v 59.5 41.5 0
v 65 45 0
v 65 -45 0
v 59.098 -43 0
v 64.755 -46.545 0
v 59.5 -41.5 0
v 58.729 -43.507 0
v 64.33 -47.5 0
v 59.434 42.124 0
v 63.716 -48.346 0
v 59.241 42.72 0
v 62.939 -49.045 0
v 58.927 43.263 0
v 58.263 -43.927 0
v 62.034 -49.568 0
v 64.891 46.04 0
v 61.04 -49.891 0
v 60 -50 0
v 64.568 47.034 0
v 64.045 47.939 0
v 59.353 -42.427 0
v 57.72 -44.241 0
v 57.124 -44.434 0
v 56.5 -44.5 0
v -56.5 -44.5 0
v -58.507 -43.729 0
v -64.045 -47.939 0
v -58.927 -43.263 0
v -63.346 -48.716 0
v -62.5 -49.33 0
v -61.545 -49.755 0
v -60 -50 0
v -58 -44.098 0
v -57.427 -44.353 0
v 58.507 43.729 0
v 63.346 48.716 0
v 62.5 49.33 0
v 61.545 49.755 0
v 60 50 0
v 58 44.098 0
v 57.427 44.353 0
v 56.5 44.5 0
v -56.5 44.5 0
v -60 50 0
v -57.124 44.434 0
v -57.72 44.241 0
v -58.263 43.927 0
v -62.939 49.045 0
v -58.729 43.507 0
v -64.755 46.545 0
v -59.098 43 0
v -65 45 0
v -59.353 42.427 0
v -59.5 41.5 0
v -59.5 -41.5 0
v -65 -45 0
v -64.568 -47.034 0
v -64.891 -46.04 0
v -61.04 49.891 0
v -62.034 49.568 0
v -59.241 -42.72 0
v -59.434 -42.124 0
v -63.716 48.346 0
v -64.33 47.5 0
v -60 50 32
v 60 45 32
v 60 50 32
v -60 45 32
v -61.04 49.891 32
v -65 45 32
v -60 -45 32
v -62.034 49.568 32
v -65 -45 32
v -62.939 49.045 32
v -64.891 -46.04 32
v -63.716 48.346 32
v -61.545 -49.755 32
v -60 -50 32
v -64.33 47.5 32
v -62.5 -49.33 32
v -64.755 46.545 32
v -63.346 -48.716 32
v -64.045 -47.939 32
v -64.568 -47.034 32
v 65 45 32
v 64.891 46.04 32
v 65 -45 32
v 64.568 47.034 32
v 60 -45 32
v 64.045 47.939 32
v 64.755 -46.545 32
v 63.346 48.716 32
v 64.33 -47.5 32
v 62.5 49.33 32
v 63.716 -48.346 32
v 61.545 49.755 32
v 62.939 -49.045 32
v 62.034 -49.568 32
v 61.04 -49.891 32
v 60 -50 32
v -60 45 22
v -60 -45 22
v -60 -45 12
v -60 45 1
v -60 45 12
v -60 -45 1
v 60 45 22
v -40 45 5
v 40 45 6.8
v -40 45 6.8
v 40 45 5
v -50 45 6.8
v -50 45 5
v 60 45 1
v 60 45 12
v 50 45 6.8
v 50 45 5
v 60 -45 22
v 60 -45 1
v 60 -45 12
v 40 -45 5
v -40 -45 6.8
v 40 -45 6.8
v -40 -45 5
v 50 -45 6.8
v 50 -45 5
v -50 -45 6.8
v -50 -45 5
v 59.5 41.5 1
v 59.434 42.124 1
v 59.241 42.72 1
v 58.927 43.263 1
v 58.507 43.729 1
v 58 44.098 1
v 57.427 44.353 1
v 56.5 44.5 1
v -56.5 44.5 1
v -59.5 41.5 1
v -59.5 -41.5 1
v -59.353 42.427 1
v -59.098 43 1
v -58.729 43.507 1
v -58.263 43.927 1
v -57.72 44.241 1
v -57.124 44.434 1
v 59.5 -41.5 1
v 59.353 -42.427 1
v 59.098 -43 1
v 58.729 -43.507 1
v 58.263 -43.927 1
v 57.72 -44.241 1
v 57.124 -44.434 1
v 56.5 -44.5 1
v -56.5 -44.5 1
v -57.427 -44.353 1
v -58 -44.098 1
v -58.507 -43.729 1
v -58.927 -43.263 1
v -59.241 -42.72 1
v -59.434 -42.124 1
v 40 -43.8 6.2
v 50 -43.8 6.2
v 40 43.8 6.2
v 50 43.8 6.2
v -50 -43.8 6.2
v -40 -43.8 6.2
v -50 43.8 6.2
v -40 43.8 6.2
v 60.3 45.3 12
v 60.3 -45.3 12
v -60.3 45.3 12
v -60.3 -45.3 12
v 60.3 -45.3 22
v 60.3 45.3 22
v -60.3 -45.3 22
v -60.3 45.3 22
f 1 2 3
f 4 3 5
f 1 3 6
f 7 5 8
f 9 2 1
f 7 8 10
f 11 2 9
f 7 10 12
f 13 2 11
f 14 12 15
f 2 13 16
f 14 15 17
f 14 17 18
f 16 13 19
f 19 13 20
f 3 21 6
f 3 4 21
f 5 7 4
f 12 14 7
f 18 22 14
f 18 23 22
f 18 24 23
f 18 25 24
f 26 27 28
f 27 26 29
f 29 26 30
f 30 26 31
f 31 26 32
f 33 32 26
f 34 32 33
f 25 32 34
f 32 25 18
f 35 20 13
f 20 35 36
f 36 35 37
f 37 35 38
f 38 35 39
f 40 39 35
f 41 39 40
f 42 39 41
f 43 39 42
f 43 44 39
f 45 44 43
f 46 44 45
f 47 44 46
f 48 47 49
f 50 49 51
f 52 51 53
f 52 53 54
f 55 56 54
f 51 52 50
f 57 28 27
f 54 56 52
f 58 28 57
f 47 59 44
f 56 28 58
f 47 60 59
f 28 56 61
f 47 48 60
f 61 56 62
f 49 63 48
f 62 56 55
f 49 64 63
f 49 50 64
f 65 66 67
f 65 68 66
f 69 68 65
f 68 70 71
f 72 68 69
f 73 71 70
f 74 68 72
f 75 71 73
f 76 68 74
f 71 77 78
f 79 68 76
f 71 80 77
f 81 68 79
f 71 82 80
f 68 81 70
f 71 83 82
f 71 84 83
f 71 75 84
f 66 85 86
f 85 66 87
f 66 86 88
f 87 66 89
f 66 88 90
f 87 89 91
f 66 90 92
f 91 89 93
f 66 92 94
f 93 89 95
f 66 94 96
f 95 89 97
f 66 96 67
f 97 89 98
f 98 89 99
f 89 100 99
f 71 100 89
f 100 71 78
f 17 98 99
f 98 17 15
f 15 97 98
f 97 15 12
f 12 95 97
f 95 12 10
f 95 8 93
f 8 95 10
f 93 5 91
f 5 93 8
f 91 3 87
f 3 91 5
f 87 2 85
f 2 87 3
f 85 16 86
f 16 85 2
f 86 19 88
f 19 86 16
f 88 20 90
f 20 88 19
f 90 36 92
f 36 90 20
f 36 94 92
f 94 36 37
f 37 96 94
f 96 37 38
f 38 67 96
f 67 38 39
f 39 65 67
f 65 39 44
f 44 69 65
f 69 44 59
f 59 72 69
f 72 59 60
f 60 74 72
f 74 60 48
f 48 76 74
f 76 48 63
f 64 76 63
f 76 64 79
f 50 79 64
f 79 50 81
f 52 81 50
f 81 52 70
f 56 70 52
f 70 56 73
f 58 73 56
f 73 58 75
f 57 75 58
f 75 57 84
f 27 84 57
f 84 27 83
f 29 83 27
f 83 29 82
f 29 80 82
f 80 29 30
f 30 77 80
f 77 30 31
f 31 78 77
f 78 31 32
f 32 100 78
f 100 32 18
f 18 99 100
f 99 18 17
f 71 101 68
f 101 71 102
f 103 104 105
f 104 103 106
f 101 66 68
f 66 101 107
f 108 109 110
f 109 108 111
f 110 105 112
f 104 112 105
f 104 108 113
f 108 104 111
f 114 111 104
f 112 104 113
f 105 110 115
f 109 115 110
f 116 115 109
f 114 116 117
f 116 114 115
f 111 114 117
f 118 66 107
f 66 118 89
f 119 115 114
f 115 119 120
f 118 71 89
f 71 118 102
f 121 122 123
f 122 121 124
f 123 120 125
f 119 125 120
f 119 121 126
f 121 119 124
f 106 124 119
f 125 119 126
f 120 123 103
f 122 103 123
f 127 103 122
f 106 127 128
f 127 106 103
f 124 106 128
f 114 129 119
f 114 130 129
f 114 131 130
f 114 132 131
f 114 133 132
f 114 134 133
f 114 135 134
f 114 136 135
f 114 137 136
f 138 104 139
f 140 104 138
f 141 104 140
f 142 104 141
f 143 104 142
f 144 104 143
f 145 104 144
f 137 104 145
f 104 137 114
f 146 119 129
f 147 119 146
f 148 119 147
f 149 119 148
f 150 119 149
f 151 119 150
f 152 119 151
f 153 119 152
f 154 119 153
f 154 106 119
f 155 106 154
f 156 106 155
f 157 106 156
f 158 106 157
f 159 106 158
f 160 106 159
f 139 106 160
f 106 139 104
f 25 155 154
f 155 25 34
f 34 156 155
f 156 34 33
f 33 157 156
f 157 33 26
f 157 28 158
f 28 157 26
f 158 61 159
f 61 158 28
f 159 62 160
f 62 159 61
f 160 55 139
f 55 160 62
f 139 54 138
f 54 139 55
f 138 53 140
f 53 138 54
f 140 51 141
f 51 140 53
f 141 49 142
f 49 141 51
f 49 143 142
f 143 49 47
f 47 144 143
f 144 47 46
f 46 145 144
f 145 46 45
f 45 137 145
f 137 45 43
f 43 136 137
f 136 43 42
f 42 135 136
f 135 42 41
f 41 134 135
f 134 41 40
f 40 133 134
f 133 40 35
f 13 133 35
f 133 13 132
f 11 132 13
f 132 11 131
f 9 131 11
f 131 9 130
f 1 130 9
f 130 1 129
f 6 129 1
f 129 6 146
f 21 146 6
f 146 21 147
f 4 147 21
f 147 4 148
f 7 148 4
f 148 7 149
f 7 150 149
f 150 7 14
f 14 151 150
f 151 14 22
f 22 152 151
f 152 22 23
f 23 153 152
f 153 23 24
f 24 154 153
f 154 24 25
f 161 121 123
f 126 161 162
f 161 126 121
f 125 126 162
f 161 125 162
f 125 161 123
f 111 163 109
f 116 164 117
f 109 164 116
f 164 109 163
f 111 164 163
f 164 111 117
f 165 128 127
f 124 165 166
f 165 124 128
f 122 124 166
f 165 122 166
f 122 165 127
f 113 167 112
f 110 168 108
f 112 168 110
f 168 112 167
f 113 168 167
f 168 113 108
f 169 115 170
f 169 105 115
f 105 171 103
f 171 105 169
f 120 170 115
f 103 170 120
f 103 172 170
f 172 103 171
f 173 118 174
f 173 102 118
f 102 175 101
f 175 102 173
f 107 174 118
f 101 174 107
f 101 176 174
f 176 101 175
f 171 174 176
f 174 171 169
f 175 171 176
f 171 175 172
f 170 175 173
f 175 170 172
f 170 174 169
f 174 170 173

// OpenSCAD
// file: battery-box/terminal.scad
$fs = 0.5;

base_terminal_size = [10, 1, 10];

module cutout_base(thickness) {
  translate([0, 0, -0.01]) {
    linear_extrude(thickness + 0.02) {
      hull() {
        translate([0, -2, 0]) circle(0.7);
        translate([0, 2, 0]) circle(0.7);
      }
    }
  }
}

module cutout(dimensions) {
  rotate([-90, -90, 0]) {
    translate(v=[dimensions.z / 2 + dimensions.z / 6, dimensions.x / 2, 0])
      cutout_base(dimensions.y);
    translate(v=[dimensions.z / 2 - dimensions.z / 6, dimensions.x / 2, 0])
      cutout_base(dimensions.y);
  }
}

module terminal(dimensions = [9, 0.5, 9]) {
  difference() {
    scale(
      [
        dimensions.x / base_terminal_size.x,
        dimensions.y / base_terminal_size.y,
        dimensions.z / base_terminal_size.z,
      ]
    )
      translate([0, base_terminal_size.y, base_terminal_size.x]) {
        rotate([90, 90, 0]) {
          linear_extrude(base_terminal_size.y) {
            square([base_terminal_size.x, base_terminal_size.z]);
          }
        }
      }
    cutout(dimensions);
  }
}

terminal();
// file: battery-box/spring.scad
use <terminal.scad>;

base_spring_size = [12, 4];

module spring_half() {

  // dont even ask
  line = concat(
    // flat line
    [[4, 2]],
    // wide curve
    [for (i = [1.5:-0.05:-1.5]) [i, sqrt(1 - ( (i - 1.5) / 3) ^ 2) * 2]],
    // semi-circle (half of the horizontal spring)
    [for (i = [-1.5:0.05:0]) [i, -sqrt(1 - ( (i + 0.75) / 0.75) ^ 2) * 0.75]]
  );

  polygon(concat(line, [for (i = [len(line) - 1:-1:0]) line[i] + [0.001, 0.001]]));
}

module spring_one_side() {
  spring_half();
  rotate([0, 0, 180]) spring_half();
}

module spring(dimensions = [10, 3, 10], thickness = 0.5) {
  spring_scale = [
    (dimensions.x - thickness) / (base_spring_size.x),
    (dimensions.y - thickness) / (base_spring_size.y),
  ];
  spring_size = [
    base_spring_size.x * spring_scale.x,
    base_spring_size.y * spring_scale.y,
  ] + [thickness, thickness];

  // behaves weird in preview
  difference() {
    // scaled spring
    translate(spring_size / 2) {
      linear_extrude(dimensions.z) {
        offset(r=thickness / 2) {
          scale(spring_scale) {
            translate([-3, 0, 0]) spring_one_side();
            mirror([1, 0, 0])
              translate([-3, 0, 0]) spring_one_side();
          }
        }
      }
    }

    // cutout
    cutout_thickness = thickness * 1.53;
    translate([0, dimensions.y - cutout_thickness, 0])
      cutout([dimensions.x, cutout_thickness, dimensions.z]);

    // trim ends
    color("red") {
      translate([-dimensions.x, -0.01, 0])
        cube(dimensions);
      translate([dimensions.x, -0.01, 0])
        cube(dimensions);
    }
  }
}

// cutout();
spring();
// file: battery-box/battery-box.scad
use <spring.scad>;
use <terminal.scad>;

//only for preview
use <../lithophane-box.scad>
default_vars = packed_battery_vars();

function get_battery_count(vars) = vars[0];
function get_stack_in_line(vars) = vars[1];
function get_notch_width(vars) = vars[2];
function get_battery_type(vars) = vars[3];

/* [Hidden] */
battery_sizes = [
  [14.5, 50.5], // AA
  [10.5, 45], // AAA
];

function get_battery_size(vars) = battery_sizes[get_battery_type(vars)];

thickness = 0.8;
spacing = [0.7, 0.5];

spring_thickness = 0.5;

function get_spring_size(vars) =
  let (
    battery_size = get_battery_size(vars)
  ) [battery_size.x, 3, battery_size.x - 0.05];

function get_cell_without_spring_length(vars) =
  let (
    battery_size = get_battery_size(vars)
  ) battery_size.y + spacing.y;

function get_cell_with_spring_length(vars) =
  let (
    spring_size = get_spring_size(vars)
  ) spring_size.y + get_cell_without_spring_length(vars);

function get_battery_box_dimensions(vars) =
  let (
    stack_in_line = get_stack_in_line(vars),
    battery_count = get_battery_count(vars),
    battery_size = get_battery_size(vars),
    cell_with_spring_length = get_cell_with_spring_length(vars),
    cell_without_spring_length = get_cell_without_spring_length(vars)
  ) (stack_in_line) ?
    [
      battery_size.x + spacing.x * 2,
      // wall_length
      cell_with_spring_length + cell_without_spring_length * (battery_count - 1),
      battery_size.x,
    ]
  : [
    battery_size.x * battery_count + spacing.x * (battery_count + 1),
    cell_with_spring_length,
    battery_size.x,
  ];

function get_notch_height(vars) = get_notch_width(vars) * sqrt(2);

module inline_separator(vars) {
  battery_size = get_battery_size(vars);

  translate([0, spacing.y, battery_size.x]) {
    rotate([90, 90, 0]) {
      linear_extrude(spacing.y) {
        difference() {
          polygon([[0, 0], [1, 0], [1, 1], [0, 1], [0.5, 0.5]] * battery_size.x);
          hull() {
            translate([0.5, 0.5] * battery_size.x) circle(r=0.3 * battery_size.x);
            translate([0, 0.2] * battery_size.x) square([0.1, 0.6] * battery_size.x);
          }
        }
      }
    }
  }
}

module parallel_separator(vars) {
  battery_size = get_battery_size(vars);
  cell_with_spring_length = get_cell_with_spring_length(vars);

  translate([0, 0, battery_size.x]) {
    rotate([0, 90, 0]) {
      linear_extrude(spacing.x) {
        difference() {
          intersection() {
            offset(r=-1)
              offset(r=2) {
                polygon(
                  [
                    for (
                      dim = [
                        [0.1, 0],
                        [1, 0],
                        [1, 1],
                        [0.1, 1],
                        [0.1, 0.85],
                        [0.5, 0.85],
                        [0.5, 0.15],
                        [0.1, 0.15],
                      ]
                    ) [dim.x * battery_size.x, dim.y * cell_with_spring_length],
                  ]
                );
              }
            square([battery_size.x, cell_with_spring_length]);
          }
          slot_offset = spacing.y;
          slot_width = spacing.y * 1.5;
          translate(
            [
              battery_size.x * 0.15,
              cell_with_spring_length - slot_offset - slot_width,
            ]
          )
            square([battery_size.x * 0.7, slot_width]);
          translate([battery_size.x * 0.15, slot_offset])
            square([battery_size.x * 0.7, slot_width]);
        }
      }
    }
  }
}

module cell_with_spring(vars) {
  spring_size = get_spring_size(vars);
  battery_size = get_battery_size(vars);

  spring_offset = [0, 0.5];
  spring(spring_size);
  linear_extrude(thickness)
    translate([0, spring_size.y] + spring_offset)
      square(battery_size - spring_offset);
}

module cell_without_spring(vars) {
  battery_size = get_battery_size(vars);

  linear_extrude(thickness)
    square(battery_size);
}

module wall(vars, length) {
  battery_size = get_battery_size(vars);

  linear_extrude(height=battery_size.x)
    square([spacing.x, length]);
}

module wall_without_spring(vars) {
  wall(vars, get_cell_without_spring_length(vars));
}

module terminal_sized(vars) {
  battery_size = get_battery_size(vars);

  terminal([battery_size.x, spacing.y, battery_size.x]);
}

module notch(vars) {
  box_dimensions = get_battery_box_dimensions(vars);
  notch_width = get_notch_width(vars);

  notch_base_size = [
    box_dimensions.x,
    box_dimensions.y,
    0.01,
  ];
  difference() {
    hull() {
      cube(notch_base_size, center=true);
      translate([0, 0, get_notch_height(vars)])
        cube(notch_base_size + notch_width * 2 * [1, 1, 0], center=true);
    }
    cube(box_dimensions, center=true);
  }
}

module battery_box(vars) {
  battery_count = get_battery_count(vars);
  stack_in_line = get_stack_in_line(vars);
  battery_size = get_battery_size(vars);
  cell_with_spring_length = get_cell_with_spring_length(vars);
  cell_without_spring_length = get_cell_without_spring_length(vars);
  spring_size = get_spring_size(vars);

  first_cell_size = [battery_size.x, spring_size.y + battery_size.y];
  inline_cell_size = [battery_size.x, spacing.y + battery_size.y];
  parallel_cell_size = [spacing.x + battery_size.x, battery_size.y];
  if (stack_in_line) {
    wall_length = cell_with_spring_length + cell_without_spring_length * (battery_count - 1);
    wall(vars, wall_length);
    translate([spacing.x, 0]) {
      cell_with_spring(vars);
      translate([spring_size.x, 0]) {
        wall(vars, wall_length);
      }
    }
    if (battery_count > 1) {
      for (i = [1:battery_count - 1]) {
        offset = [0, first_cell_size.y + inline_cell_size.y * (i - 1)];
        translate(offset) {
          translate([spacing.x, 0]) {
            inline_separator(vars);
            translate([0, spacing.y]) cell_without_spring(vars);
          }
        }
      }
    }
    translate(
      [spacing.x, first_cell_size.y + inline_cell_size.y * (battery_count - 1)]
    ) {
      terminal_sized(vars);
    }
  } else {
    wall(vars, cell_with_spring_length);
    translate(
      [
        spacing.x + first_cell_size.x + parallel_cell_size.x * (battery_count - 1),
        0,
      ]
    ) {
      wall(vars, cell_with_spring_length);
    }
    translate([spacing.x, 0]) {
      cell_with_spring(vars);
      translate([0, first_cell_size.y, 0]) terminal_sized(vars);
      if (battery_count > 1) {
        for (i = [1:battery_count - 1]) {
          offset = [first_cell_size.x + parallel_cell_size.x * (i - 1), 0];
          translate(offset) {
            parallel_separator(vars);
            if (i % 2 == 1) {
              translate([0, first_cell_size.y + spacing.y])
                mirror([0, 1, 0]) {
                  translate([spacing.x, 0]) cell_with_spring(vars);
                  translate([spacing.x, first_cell_size.y, 0]) terminal_sized(vars);
                }
            } else {
              translate([spacing.x, 0]) cell_with_spring(vars);
              translate([spacing.x, first_cell_size.y, 0]) terminal_sized(vars);
            }
          }
        }
      }
    }
  }

  box_dimensions = get_battery_box_dimensions(vars);
  translate(
    box_dimensions / 2 + [0, 0, box_dimensions.z / 2 - get_notch_height(vars)]
  )
    notch(vars);
}

module battery_box_cutout(vars) {
  box_dimensions = get_battery_box_dimensions(vars);

  translation_up = [0, 0, box_dimensions.z / 2];
  color("#d888") {
    translate(translation_up) {
      cube(box_dimensions + [0.2, 0.2, 0.2], center=true);
      translate([0, 0, box_dimensions.z / 2 - get_notch_height(vars)])
        notch(vars);
    }
  }
}

if ($preview) {
  box_dimensions = get_battery_box_dimensions(default_vars);
  translate(
    [box_dimensions.x, box_dimensions.y, 0] / 2 + (
      [box_dimensions.x + 10, 0, 0]
    )
  )
    battery_box_cutout(default_vars);
}

battery_box(default_vars);
echo(str("default_vars = ", default_vars));
// file: switch.scad
// harsh approximation of KCD1-11 switch

front_panel_width = 15;
front_panel_height = 10;

// function for the sake of export
function get_switch_body_dimensions() = [10, 14, 9];

switch_body_dimensions = get_switch_body_dimensions();

module switch(body_offset = 0) {
  body_depth = switch_body_dimensions.x;
  color("#1b1b1be8") {
    translate([body_depth / 2, front_panel_width / 2, front_panel_height / 2]) {
      rotate([0, -90, 0]) {
        // front panel
        translate([0, 0, body_depth / 2 + 0.25]) {
          hull() {
            translate([0, 0, 0.25]) {
              cube([front_panel_height - 1, front_panel_width - 1, 1], center=true);
            }
            cube([front_panel_height, front_panel_width, 0.5], center=true);
          }
        }

        // main body
        cube([switch_body_dimensions.z + body_offset, switch_body_dimensions.y + body_offset, body_depth], center=true);

        // pins
        for (i = [-1:1]) {
          translate([0, 5 * i, -5.5]) {
            cube([4, 2, 1], center=true);
            translate([0, 0, -2]) {
              cube([3.7, 0.5, 3], center=true);
            }
          }
        }
      }
    }
  }
}

switch();
// file: backpanel.scad
include <common.scad>
use <battery-box/battery-box.scad>

//only for preview
use <lithophane-box.scad>

module keyhole(diameter = 5) {
  radius = diameter / 2;
  height = radius;
  inner_radius = radius * 0.7;
  inner_height = height / 2;
  outer_height = height - inner_height;
  cylinder(h=height, r=radius);
  translate([0, 0, outer_height]) {
    hull() {
      cylinder(h=inner_height, r=radius);
      translate([0, diameter, 0])
        cylinder(h=inner_height, r=radius);
    }
  }
  hull() {
    cylinder(h=height, r=inner_radius);
    translate([0, diameter, 0])
      cylinder(h=height, r=inner_radius);
  }
}

module placed_battery_box(battery_vars) {
  rotate([180, 0, 90])
    translate([0, 0, -get_battery_box_dimensions(battery_vars).z])
      battery_box_cutout(battery_vars);
}

module backpanel(wall_thickness, lithophane_vars, battery_vars) {
  difference() {
    color("#055366ab") {
      linear_extrude(backpanel_thickness) {
        box_surface(wall_thickness, lithophane_vars);
      }
      translate([0, 0, backpanel_thickness]) {
        linear_extrude(backpanel_protrusion) {
          difference() {
            lithophane_surface(lithophane_vars);
            offset(delta=-1) {
              lithophane_surface(lithophane_vars);
            }
          }
        }
      }
    }
    placed_battery_box(battery_vars);

    translate([0, get_lithophane_height(lithophane_vars) / 2 * 0.7, -0.01])
      keyhole(diameter=6);
  }
  if ($preview) {
    color("#d882")
      placed_battery_box(battery_vars);
  }
}

backpanel(
  get_wall_thickness(packed_frame_vars()),
  packed_lithophane_vars(),
  packed_battery_vars()
);
// file: lithophane-box.scad
use <frame.scad>
use <backpanel.scad>
use <switch.scad>
include <common.scad>

show_frame = true;
show_backpanel = true;

/* [Lithophane] */
lithophane_width = 120;
lithophane_height = 90;
lithophane_thickness = 4;

function packed_lithophane_vars() =
  [
    lithophane_width,
    lithophane_height,
    lithophane_thickness,
  ];
lithophane_vars = packed_lithophane_vars();

/* [Frame] */
wall_thickness = 5;
lip_depth = 1;
lip_width = 0.5;
lip_corner_radius = 3;

function packed_frame_vars() =
  [
    wall_thickness,
    lip_depth,
    lip_width,
    lip_corner_radius,
  ];
frame_vars = packed_frame_vars();

/* [Battery box] */
battery_count = 3; // I use 3xAAA for 5v LED strip
stack_in_line = false;
notch_width = 1; // .1
battery_type = 1; // [0:AA, 1:AAA]

function packed_battery_vars() =
  [
    battery_count,
    stack_in_line,
    notch_width,
    battery_type,
  ];
battery_vars = packed_battery_vars();

module switch_placed(wall_height, lithophane_vars) {
  lithophane_width = get_lithophane_width(lithophane_vars);
  lithophane_height = get_lithophane_height(lithophane_vars);

  translate(
    [
      -(lithophane_width / 2 + wall_thickness),
      -(lithophane_height / 2 - 3),
      wall_height - get_switch_body_dimensions().z,
    ]
  )
    switch(body_offset=0.1);
}

if (show_frame) {
  difference() {
    frame(frame_vars, lithophane_vars);
    switch_placed(get_wall_height(frame_vars, lithophane_vars), lithophane_vars);
  }
}

if (show_backpanel) {
  lithophane_height = get_lithophane_height(lithophane_vars);
  wall_thickness = get_wall_thickness(frame_vars);
  wall_height = get_wall_height(frame_vars, lithophane_vars);

  backpanel_placement = [0, 0, wall_height + backpanel_thickness];
  backpanel_rotation = [180, 0, 0];
  backpanel_y_offset = show_frame ? lithophane_height + wall_thickness * 3 : 0;

  translate([0, backpanel_y_offset, 0]) {
    rotate(backpanel_rotation) {
      translate(-backpanel_placement) {
        difference() {
          translate(backpanel_placement) {
            rotate(backpanel_rotation) {
              backpanel(wall_thickness, lithophane_vars, battery_vars);
            }
          }
          switch_placed(wall_height, lithophane_vars);
        }
      }
    }
  }
}
// file: common.scad
$fs = 0.5;

// Lithophane
function get_lithophane_width(vars) = vars[0];
function get_lithophane_height(vars) = vars[1];
function get_lithophane_thickness(vars) = vars[2];
function get_lithophane_size(vars) =
  let (
    lithophane_width = get_lithophane_width(vars),
    lithophane_height = get_lithophane_height(vars)
  ) [lithophane_width, lithophane_height];

// Frame
function get_wall_thickness(vars) = vars[0];
function get_lip_depth(vars) = vars[1];
function get_lip_width(vars) = vars[2];
function get_lip_corner_radius(vars) = vars[3];

// Back panel
backpanel_thickness = 5;
backpanel_protrusion = 5;

// Advanced
led_strip_thickness = 10;
led_lithophane_spacing = 7;
led_backpanel_spacing = 5;
frame_notch_width = 10;
frame_notch_height = 1.2;

function get_led_strip_start(frame_vars, lithophane_vars) =
  let (
    lip_depth = get_lip_depth(frame_vars),
    lithophane_thickness = get_lithophane_thickness(lithophane_vars)
  ) (
    lip_depth + lithophane_thickness + led_lithophane_spacing
  );

function get_wall_height(frame_vars, lithophane_vars) =
  get_led_strip_start(frame_vars, lithophane_vars) + (
    led_strip_thickness
  ) + (
    backpanel_protrusion
  ) + (
    led_backpanel_spacing
  );

module lithophane_surface(lithophane_vars) {
  square(size=get_lithophane_size(lithophane_vars), center=true);
}

module box_surface(wall_thickness, lithophane_vars) {
  offset(r=wall_thickness) {
    lithophane_surface(lithophane_vars);
  }
}
// main file
include <common.scad>

//only for preview
use <lithophane-box.scad>
frame_vars = packed_frame_vars();
lithophane_vars = packed_lithophane_vars();

notch_width = frame_notch_width;
notch_height = frame_notch_height;

module notch() {
  color("#ca5a109f") {
    translate([-notch_width / 2, 0, notch_height]) {
      rotate([0, 90, 0]) {
        linear_extrude(height=notch_width) {
          polygon(
            points=[
              [-notch_height / 2, 0],
              [notch_height, 0],
              [0, notch_height],
            ]
          );
        }
      }
    }
  }
}

function get_notch_offset(frame_vars, lithophane_vars) =
  let (
    lithophane_width = get_lithophane_width(lithophane_vars),
    lithophane_height = get_lithophane_height(lithophane_vars),
    lithophane_thickness = get_lithophane_thickness(lithophane_vars),
    lip_depth = get_lip_depth(frame_vars)
  ) [
      lithophane_width / 2 - notch_width * 1.5,
      -lithophane_height / 2,
      lip_depth + lithophane_thickness,
  ];

module notch_pair(notch_offset) {
  translate([0, notch_offset.y, 0]) notch();
  mirror([0, 1, 0]) translate([0, notch_offset.y, 0]) notch();
}

module led_strip(frame_vars, lithophane_vars) {
  translate(
    [0, 0, get_led_strip_start(frame_vars, lithophane_vars)]
  ) {
    color("#e7f071ff") {
      linear_extrude(led_strip_thickness) {
        difference() {
          offset(delta=0.3) lithophane_surface(lithophane_vars);
          offset(delta=-1) lithophane_surface(lithophane_vars);
        }
      }
    }
    color("#000") {
      translate([0, get_lithophane_height(lithophane_vars) / 2 - 1, 3])
        rotate([90, 0, 0])
          linear_extrude(height=0.01)
            text("LED Strip preview", size=3, halign="center");
    }
  }
}

module frame_with_notches(frame_vars, lithophane_vars) {
  lip_depth = get_lip_depth(frame_vars);
  color("#0abeebab") {
    // walls
    linear_extrude(
      height=get_wall_height(frame_vars, lithophane_vars)
    ) {
      difference() {
        box_surface(get_wall_thickness(frame_vars), lithophane_vars);
        lithophane_surface(lithophane_vars);
      }
    }

    // lip (thin frame in front of lithophane)
    linear_extrude(lip_depth) {
      lip_corner_radius = get_lip_corner_radius(frame_vars);
      lip_width = get_lip_width(frame_vars);

      difference() {
        lithophane_surface(lithophane_vars);
        offset(r=lip_corner_radius)
          offset(delta=-(lip_corner_radius + lip_width))
            lithophane_surface(lithophane_vars);
      }
    }
  }

  notch_offset = get_notch_offset(frame_vars, lithophane_vars);

  // notches to secure lithophane in place
  translate([0, 0, notch_offset.z]) {
    translate([notch_offset.x, 0, 0]) notch_pair(notch_offset);
    translate([-notch_offset.x, 0, 0]) notch_pair(notch_offset);
  }
}

module frame(frame_vars, lithophane_vars) {

  difference() {
    frame_with_notches(frame_vars, lithophane_vars);
    led_strip(frame_vars, lithophane_vars);
  }
  if ($preview) {
    led_strip(frame_vars, lithophane_vars);
  }
}

frame(frame_vars, lithophane_vars);
